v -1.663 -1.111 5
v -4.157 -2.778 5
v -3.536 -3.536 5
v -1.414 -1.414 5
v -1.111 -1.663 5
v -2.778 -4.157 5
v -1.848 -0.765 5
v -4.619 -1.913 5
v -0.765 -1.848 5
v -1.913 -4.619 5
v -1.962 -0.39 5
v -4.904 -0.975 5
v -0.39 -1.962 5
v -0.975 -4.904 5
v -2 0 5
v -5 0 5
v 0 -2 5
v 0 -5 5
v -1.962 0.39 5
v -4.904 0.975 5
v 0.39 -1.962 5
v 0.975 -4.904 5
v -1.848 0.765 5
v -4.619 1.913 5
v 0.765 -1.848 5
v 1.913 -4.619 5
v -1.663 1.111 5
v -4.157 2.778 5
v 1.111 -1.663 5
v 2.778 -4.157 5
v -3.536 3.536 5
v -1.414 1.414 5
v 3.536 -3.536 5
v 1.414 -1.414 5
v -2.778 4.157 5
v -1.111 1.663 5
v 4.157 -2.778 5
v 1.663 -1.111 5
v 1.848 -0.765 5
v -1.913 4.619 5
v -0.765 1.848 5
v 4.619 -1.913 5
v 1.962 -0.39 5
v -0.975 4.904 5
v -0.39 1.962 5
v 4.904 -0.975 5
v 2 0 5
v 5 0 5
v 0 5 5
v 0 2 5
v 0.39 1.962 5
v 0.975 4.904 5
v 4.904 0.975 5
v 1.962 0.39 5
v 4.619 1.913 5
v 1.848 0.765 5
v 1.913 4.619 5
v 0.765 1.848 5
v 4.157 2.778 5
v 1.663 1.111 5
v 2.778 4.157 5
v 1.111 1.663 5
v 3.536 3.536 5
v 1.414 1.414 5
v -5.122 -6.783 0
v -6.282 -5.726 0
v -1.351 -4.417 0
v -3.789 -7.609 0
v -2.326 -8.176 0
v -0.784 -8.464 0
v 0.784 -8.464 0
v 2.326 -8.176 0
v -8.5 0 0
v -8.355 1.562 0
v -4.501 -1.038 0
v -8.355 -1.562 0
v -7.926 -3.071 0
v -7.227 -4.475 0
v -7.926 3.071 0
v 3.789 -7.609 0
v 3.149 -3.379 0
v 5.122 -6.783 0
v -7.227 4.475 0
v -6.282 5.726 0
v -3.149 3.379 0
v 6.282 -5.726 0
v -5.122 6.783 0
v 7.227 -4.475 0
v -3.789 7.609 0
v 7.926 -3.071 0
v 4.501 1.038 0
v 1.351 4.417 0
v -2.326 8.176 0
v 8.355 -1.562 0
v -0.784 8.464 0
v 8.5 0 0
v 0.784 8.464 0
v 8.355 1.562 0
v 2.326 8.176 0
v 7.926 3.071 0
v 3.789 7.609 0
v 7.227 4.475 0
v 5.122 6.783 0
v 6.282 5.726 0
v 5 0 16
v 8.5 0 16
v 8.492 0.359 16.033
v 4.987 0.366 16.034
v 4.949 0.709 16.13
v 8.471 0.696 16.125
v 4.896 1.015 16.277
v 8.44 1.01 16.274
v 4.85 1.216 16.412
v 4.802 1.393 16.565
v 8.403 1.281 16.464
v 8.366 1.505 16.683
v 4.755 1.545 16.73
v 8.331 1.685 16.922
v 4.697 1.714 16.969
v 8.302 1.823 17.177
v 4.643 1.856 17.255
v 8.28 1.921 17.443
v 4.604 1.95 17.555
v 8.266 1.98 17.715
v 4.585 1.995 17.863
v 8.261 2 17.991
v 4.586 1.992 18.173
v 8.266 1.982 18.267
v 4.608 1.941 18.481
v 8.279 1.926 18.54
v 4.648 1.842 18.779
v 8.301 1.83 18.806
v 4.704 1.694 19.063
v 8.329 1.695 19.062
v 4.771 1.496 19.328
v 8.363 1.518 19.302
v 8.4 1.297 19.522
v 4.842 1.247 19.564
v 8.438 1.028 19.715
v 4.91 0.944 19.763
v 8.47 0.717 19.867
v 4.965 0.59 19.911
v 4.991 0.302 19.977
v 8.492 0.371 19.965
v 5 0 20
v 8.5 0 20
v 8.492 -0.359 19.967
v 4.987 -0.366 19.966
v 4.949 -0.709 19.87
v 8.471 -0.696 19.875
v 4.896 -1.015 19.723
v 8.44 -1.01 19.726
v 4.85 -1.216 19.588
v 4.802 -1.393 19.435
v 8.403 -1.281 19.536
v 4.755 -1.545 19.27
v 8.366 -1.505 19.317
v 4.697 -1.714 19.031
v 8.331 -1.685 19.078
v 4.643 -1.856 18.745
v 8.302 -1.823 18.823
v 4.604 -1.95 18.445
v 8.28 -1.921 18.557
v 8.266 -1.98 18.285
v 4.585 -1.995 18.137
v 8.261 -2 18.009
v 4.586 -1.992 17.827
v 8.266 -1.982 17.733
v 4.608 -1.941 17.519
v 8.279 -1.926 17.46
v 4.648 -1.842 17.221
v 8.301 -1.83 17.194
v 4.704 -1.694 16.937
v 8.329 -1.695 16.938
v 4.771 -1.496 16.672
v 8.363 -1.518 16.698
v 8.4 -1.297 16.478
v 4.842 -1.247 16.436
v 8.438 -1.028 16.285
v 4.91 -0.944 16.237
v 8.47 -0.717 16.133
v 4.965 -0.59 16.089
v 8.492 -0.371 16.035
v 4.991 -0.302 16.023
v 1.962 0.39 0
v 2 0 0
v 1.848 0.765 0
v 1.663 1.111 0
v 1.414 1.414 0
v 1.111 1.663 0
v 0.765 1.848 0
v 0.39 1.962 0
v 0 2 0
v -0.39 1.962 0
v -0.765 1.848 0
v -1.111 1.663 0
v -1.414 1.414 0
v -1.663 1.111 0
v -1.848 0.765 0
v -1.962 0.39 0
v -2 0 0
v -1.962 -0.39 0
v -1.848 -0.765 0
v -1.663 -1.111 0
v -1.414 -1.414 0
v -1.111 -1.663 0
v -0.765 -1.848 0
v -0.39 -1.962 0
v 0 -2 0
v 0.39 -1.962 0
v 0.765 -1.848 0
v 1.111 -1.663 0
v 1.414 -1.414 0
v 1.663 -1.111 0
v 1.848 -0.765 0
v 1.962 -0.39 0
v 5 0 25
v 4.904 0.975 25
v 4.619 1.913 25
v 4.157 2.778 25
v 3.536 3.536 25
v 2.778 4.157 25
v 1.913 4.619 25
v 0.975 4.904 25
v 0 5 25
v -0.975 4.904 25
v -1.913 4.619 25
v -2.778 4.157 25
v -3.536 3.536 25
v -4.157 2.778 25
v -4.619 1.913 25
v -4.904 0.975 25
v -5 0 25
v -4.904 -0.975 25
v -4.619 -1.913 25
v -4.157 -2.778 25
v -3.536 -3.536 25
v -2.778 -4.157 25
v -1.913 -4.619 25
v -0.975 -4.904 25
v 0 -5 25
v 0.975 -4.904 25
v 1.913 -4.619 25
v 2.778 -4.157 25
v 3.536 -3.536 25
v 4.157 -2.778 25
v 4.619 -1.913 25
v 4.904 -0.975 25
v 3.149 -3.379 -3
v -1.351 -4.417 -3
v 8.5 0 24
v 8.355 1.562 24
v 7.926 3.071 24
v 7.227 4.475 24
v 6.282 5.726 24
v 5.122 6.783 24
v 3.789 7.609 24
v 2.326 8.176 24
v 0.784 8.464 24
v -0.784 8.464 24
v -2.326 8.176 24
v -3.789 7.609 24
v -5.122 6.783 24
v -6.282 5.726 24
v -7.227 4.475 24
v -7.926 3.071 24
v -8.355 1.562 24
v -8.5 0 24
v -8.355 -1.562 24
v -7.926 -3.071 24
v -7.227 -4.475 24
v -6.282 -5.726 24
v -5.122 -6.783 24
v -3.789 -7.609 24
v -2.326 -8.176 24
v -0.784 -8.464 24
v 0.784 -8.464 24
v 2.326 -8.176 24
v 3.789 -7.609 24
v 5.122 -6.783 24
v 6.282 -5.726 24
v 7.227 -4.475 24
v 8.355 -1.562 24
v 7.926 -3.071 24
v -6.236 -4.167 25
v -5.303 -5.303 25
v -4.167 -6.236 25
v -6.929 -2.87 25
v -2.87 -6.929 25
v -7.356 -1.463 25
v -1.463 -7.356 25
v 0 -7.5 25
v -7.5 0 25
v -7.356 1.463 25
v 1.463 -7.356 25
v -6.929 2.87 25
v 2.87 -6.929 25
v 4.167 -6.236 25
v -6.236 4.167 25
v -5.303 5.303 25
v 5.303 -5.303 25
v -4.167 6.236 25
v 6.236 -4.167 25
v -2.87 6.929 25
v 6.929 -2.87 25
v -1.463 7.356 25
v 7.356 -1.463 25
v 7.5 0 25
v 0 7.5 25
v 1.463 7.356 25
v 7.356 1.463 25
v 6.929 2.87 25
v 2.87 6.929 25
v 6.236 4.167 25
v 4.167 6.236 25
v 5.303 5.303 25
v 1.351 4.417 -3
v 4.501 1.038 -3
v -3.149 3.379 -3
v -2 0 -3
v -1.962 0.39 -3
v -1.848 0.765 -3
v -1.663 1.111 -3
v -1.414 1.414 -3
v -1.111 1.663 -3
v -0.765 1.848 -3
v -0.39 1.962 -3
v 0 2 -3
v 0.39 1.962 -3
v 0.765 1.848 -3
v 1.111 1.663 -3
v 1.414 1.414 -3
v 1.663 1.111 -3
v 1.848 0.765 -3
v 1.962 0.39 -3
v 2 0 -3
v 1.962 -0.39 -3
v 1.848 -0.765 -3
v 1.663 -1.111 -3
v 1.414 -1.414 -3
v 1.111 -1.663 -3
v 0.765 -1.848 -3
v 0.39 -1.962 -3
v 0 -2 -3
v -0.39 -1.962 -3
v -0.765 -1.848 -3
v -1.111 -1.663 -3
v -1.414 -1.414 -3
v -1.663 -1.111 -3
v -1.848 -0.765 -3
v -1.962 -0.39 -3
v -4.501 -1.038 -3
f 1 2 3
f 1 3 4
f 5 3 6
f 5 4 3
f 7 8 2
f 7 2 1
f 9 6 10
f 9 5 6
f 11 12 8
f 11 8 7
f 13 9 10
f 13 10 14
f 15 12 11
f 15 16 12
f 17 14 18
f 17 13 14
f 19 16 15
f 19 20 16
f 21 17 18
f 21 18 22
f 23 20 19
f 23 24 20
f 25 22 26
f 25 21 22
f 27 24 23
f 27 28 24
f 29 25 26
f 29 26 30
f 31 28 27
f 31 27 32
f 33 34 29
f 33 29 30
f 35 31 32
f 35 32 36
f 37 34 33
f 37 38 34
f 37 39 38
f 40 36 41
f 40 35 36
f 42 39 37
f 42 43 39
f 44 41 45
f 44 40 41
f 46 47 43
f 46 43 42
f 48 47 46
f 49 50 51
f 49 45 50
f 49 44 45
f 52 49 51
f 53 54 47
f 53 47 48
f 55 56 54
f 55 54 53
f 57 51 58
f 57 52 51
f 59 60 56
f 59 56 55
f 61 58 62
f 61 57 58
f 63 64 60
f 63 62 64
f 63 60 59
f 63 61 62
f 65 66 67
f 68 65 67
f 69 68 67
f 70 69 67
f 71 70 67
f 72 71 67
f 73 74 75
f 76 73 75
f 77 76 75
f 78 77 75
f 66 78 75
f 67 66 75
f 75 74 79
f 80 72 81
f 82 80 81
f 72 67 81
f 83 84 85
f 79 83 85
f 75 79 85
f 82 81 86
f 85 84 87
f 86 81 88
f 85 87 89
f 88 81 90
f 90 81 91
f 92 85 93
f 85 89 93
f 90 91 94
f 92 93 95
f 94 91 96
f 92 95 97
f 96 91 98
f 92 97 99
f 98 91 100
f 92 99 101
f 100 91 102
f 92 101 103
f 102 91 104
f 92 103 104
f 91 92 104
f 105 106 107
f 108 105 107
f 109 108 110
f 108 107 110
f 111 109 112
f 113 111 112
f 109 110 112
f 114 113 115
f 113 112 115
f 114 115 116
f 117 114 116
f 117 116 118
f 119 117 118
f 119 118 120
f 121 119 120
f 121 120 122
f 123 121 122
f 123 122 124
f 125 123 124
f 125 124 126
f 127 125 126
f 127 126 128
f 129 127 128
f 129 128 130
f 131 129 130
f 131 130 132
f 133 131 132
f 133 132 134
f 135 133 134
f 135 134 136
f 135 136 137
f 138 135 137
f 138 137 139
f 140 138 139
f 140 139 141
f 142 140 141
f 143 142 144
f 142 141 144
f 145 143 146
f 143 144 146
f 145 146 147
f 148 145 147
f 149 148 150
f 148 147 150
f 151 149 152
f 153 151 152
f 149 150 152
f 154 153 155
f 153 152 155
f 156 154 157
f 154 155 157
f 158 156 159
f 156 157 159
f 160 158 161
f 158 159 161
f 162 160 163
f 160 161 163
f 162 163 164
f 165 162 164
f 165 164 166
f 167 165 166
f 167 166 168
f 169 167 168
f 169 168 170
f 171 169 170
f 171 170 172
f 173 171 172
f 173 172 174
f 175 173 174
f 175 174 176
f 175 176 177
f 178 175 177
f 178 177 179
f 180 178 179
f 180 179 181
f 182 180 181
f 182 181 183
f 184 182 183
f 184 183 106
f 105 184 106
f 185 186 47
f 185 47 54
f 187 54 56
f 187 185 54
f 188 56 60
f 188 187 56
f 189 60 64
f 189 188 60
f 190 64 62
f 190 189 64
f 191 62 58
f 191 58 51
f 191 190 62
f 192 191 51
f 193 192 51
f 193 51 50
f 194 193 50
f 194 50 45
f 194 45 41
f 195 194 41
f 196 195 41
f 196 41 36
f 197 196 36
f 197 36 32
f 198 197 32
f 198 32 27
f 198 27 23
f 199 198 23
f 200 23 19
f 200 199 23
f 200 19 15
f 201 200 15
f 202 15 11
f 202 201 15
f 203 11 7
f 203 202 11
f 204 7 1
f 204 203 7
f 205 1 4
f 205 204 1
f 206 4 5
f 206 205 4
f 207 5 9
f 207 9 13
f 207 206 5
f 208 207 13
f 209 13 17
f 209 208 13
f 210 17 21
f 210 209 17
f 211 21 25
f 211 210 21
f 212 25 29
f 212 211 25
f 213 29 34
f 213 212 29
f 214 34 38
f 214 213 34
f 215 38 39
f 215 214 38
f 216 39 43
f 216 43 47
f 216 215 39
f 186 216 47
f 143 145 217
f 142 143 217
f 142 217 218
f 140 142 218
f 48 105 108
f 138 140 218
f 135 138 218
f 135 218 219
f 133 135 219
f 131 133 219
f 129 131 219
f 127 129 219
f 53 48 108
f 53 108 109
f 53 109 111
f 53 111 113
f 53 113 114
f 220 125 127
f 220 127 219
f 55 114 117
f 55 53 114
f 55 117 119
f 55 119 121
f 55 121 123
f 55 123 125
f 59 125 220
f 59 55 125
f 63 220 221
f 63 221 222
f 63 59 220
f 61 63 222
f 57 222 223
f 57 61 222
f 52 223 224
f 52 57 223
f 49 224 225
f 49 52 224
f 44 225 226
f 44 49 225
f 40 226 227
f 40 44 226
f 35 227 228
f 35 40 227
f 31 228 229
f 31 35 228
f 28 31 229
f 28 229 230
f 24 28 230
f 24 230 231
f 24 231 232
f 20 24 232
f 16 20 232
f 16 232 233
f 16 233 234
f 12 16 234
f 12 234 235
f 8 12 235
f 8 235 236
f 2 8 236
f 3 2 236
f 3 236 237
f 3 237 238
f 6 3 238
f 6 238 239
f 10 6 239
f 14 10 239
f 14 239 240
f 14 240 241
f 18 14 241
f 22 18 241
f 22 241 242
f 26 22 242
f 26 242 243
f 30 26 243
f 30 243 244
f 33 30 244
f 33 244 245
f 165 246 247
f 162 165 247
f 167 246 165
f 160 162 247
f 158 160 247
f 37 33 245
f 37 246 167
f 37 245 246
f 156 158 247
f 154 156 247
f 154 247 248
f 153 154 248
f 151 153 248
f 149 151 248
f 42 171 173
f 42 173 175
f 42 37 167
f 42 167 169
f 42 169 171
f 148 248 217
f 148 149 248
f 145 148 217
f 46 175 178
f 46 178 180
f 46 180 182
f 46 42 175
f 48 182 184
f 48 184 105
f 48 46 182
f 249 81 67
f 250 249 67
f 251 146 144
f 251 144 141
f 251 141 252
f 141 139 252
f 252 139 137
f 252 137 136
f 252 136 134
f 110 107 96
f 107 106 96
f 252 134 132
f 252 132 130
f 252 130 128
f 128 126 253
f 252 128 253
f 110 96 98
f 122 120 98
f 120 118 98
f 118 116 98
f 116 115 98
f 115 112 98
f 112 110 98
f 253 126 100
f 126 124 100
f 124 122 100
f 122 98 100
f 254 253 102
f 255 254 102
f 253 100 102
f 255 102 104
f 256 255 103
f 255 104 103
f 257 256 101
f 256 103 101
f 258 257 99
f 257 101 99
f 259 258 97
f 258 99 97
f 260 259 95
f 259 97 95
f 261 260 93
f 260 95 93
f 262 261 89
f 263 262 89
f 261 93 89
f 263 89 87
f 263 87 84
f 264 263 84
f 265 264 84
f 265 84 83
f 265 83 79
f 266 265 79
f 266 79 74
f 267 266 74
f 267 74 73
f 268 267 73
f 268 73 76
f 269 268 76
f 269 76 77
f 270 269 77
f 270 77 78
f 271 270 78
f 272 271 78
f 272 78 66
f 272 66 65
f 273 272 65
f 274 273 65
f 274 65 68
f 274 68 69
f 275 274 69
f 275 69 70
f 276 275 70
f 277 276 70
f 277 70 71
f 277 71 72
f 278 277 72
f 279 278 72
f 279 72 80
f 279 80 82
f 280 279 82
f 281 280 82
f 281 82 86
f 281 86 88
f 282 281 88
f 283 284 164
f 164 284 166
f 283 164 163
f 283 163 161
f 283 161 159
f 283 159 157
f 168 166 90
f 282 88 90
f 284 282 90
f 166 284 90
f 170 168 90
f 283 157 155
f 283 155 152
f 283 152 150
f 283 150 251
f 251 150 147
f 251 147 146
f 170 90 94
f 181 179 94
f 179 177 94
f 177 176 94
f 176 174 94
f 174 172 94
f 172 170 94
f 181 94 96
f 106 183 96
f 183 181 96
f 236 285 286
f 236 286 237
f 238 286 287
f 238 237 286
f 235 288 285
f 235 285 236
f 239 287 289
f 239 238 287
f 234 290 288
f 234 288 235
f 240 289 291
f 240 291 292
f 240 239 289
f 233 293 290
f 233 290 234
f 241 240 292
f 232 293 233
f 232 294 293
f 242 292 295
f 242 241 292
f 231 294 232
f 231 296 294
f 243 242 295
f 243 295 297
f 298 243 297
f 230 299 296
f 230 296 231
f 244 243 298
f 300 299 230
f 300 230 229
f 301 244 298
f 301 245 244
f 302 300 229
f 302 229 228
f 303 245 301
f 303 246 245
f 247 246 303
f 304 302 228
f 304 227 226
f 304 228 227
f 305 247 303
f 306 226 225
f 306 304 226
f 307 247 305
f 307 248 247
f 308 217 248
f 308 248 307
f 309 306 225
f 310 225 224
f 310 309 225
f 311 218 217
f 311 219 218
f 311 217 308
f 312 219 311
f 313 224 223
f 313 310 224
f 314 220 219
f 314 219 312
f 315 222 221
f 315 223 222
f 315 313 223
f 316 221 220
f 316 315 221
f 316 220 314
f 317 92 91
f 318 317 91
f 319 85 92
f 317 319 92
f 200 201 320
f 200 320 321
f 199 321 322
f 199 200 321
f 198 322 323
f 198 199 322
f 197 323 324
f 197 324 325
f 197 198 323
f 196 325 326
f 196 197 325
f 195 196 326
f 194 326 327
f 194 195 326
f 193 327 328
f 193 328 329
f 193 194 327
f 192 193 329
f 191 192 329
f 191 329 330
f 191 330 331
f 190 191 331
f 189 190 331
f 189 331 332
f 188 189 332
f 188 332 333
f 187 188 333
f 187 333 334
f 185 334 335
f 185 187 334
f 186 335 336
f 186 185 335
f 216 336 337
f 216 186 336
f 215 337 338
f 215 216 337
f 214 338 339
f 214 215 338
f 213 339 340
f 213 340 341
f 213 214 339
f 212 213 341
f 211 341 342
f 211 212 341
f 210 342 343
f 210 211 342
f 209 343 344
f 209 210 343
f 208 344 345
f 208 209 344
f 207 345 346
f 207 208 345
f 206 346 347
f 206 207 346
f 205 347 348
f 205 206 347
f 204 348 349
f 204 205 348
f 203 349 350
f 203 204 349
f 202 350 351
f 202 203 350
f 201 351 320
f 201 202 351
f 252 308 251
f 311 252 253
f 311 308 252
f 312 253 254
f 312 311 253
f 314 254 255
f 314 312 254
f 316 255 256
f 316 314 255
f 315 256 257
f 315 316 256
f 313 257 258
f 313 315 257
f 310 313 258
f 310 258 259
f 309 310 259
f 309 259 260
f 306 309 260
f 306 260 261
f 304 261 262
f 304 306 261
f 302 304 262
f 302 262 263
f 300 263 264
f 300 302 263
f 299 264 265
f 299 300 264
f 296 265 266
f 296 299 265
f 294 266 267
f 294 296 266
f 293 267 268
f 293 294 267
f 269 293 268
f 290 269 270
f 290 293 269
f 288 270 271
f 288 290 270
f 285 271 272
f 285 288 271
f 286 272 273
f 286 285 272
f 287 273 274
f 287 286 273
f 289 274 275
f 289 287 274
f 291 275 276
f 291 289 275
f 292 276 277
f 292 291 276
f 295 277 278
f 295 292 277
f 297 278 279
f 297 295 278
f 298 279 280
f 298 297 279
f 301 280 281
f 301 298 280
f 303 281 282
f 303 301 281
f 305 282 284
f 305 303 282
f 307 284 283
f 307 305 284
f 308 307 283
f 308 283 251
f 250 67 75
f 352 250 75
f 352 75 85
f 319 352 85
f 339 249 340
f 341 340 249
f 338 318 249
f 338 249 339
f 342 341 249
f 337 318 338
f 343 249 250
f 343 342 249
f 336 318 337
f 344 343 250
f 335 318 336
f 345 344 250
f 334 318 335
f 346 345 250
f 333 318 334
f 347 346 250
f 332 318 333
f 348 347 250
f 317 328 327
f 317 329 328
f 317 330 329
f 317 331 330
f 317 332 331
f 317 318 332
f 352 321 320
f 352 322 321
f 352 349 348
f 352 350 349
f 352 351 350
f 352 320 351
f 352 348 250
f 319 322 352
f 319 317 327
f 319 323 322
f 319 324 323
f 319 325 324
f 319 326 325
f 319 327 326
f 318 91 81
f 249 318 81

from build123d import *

# Parameters (mm, degrees)
SKETCH1_R           = 8.5
SKETCH1_R_2         = 2
BOSS_EXTRUDE1_DEPTH = 5
SKETCH2_R           = 8.5
SKETCH2_R_2         = 5
BOSS_EXTRUDE2_DEPTH = 20
SKETCH3_R           = 2
BOSS_EXTRUDE3_DEPTH = 3
CHAMFER1_SIZE       = 1
CUT_EXTRUDE1_REACH  = 19
SKETCH4_R           = 2


with BuildPart() as part:
    # Sketch1 → Boss-Extrude1 (new body)
    with BuildSketch(Plane.XY):
        Circle(SKETCH1_R)
        Circle(SKETCH1_R_2, mode=Mode.SUBTRACT)
    extrude(amount=BOSS_EXTRUDE1_DEPTH)

    # Sketch2 → Boss-Extrude2 (add)
    with BuildSketch(Plane.XY.offset(5)):
        Circle(SKETCH2_R)
        Circle(SKETCH2_R_2, mode=Mode.SUBTRACT)
    extrude(amount=BOSS_EXTRUDE2_DEPTH)

    # Sketch3 → Boss-Extrude3 (add)
    with BuildSketch(Plane(origin=(0, 0, 0), x_dir=(-1, 0, 0), z_dir=(0, 0, -1))):
        Polygon((-4.500595024, 1.03825708), (-3.149454519, -3.378501083), (1.351140505, -4.416758163), (4.500595024, -1.03825708), (3.149454519, 3.378501083), (-1.351140505, 4.416758163), align=None)
        Circle(SKETCH3_R, mode=Mode.SUBTRACT)
    extrude(amount=BOSS_EXTRUDE3_DEPTH)

    # Chamfer1
    chamfer1_edges = [part.edges().sort_by_distance(p)[0] for p in [
        (-8.5, 0, 25),
    ]]
    chamfer(chamfer1_edges, length=CHAMFER1_SIZE)

    # Sketch4 → Cut-Extrude1 (cut, up to next)
    with BuildSketch(Plane(origin=(8.5, 0, 0), x_dir=(0, 0, -1), z_dir=(1, 0, 0)), mode=Mode.PRIVATE) as cut_extrude1_sk1:
        with Locations((-18, 0)):
            Circle(SKETCH4_R)
    cut_extrude1_tool1 = extrude(cut_extrude1_sk1.sketch, amount=-CUT_EXTRUDE1_REACH, mode=Mode.PRIVATE) & part.part
    add(cut_extrude1_tool1.solids().sort_by_distance((8.5, 0, 18))[0], mode=Mode.SUBTRACT)


solid = part.part
